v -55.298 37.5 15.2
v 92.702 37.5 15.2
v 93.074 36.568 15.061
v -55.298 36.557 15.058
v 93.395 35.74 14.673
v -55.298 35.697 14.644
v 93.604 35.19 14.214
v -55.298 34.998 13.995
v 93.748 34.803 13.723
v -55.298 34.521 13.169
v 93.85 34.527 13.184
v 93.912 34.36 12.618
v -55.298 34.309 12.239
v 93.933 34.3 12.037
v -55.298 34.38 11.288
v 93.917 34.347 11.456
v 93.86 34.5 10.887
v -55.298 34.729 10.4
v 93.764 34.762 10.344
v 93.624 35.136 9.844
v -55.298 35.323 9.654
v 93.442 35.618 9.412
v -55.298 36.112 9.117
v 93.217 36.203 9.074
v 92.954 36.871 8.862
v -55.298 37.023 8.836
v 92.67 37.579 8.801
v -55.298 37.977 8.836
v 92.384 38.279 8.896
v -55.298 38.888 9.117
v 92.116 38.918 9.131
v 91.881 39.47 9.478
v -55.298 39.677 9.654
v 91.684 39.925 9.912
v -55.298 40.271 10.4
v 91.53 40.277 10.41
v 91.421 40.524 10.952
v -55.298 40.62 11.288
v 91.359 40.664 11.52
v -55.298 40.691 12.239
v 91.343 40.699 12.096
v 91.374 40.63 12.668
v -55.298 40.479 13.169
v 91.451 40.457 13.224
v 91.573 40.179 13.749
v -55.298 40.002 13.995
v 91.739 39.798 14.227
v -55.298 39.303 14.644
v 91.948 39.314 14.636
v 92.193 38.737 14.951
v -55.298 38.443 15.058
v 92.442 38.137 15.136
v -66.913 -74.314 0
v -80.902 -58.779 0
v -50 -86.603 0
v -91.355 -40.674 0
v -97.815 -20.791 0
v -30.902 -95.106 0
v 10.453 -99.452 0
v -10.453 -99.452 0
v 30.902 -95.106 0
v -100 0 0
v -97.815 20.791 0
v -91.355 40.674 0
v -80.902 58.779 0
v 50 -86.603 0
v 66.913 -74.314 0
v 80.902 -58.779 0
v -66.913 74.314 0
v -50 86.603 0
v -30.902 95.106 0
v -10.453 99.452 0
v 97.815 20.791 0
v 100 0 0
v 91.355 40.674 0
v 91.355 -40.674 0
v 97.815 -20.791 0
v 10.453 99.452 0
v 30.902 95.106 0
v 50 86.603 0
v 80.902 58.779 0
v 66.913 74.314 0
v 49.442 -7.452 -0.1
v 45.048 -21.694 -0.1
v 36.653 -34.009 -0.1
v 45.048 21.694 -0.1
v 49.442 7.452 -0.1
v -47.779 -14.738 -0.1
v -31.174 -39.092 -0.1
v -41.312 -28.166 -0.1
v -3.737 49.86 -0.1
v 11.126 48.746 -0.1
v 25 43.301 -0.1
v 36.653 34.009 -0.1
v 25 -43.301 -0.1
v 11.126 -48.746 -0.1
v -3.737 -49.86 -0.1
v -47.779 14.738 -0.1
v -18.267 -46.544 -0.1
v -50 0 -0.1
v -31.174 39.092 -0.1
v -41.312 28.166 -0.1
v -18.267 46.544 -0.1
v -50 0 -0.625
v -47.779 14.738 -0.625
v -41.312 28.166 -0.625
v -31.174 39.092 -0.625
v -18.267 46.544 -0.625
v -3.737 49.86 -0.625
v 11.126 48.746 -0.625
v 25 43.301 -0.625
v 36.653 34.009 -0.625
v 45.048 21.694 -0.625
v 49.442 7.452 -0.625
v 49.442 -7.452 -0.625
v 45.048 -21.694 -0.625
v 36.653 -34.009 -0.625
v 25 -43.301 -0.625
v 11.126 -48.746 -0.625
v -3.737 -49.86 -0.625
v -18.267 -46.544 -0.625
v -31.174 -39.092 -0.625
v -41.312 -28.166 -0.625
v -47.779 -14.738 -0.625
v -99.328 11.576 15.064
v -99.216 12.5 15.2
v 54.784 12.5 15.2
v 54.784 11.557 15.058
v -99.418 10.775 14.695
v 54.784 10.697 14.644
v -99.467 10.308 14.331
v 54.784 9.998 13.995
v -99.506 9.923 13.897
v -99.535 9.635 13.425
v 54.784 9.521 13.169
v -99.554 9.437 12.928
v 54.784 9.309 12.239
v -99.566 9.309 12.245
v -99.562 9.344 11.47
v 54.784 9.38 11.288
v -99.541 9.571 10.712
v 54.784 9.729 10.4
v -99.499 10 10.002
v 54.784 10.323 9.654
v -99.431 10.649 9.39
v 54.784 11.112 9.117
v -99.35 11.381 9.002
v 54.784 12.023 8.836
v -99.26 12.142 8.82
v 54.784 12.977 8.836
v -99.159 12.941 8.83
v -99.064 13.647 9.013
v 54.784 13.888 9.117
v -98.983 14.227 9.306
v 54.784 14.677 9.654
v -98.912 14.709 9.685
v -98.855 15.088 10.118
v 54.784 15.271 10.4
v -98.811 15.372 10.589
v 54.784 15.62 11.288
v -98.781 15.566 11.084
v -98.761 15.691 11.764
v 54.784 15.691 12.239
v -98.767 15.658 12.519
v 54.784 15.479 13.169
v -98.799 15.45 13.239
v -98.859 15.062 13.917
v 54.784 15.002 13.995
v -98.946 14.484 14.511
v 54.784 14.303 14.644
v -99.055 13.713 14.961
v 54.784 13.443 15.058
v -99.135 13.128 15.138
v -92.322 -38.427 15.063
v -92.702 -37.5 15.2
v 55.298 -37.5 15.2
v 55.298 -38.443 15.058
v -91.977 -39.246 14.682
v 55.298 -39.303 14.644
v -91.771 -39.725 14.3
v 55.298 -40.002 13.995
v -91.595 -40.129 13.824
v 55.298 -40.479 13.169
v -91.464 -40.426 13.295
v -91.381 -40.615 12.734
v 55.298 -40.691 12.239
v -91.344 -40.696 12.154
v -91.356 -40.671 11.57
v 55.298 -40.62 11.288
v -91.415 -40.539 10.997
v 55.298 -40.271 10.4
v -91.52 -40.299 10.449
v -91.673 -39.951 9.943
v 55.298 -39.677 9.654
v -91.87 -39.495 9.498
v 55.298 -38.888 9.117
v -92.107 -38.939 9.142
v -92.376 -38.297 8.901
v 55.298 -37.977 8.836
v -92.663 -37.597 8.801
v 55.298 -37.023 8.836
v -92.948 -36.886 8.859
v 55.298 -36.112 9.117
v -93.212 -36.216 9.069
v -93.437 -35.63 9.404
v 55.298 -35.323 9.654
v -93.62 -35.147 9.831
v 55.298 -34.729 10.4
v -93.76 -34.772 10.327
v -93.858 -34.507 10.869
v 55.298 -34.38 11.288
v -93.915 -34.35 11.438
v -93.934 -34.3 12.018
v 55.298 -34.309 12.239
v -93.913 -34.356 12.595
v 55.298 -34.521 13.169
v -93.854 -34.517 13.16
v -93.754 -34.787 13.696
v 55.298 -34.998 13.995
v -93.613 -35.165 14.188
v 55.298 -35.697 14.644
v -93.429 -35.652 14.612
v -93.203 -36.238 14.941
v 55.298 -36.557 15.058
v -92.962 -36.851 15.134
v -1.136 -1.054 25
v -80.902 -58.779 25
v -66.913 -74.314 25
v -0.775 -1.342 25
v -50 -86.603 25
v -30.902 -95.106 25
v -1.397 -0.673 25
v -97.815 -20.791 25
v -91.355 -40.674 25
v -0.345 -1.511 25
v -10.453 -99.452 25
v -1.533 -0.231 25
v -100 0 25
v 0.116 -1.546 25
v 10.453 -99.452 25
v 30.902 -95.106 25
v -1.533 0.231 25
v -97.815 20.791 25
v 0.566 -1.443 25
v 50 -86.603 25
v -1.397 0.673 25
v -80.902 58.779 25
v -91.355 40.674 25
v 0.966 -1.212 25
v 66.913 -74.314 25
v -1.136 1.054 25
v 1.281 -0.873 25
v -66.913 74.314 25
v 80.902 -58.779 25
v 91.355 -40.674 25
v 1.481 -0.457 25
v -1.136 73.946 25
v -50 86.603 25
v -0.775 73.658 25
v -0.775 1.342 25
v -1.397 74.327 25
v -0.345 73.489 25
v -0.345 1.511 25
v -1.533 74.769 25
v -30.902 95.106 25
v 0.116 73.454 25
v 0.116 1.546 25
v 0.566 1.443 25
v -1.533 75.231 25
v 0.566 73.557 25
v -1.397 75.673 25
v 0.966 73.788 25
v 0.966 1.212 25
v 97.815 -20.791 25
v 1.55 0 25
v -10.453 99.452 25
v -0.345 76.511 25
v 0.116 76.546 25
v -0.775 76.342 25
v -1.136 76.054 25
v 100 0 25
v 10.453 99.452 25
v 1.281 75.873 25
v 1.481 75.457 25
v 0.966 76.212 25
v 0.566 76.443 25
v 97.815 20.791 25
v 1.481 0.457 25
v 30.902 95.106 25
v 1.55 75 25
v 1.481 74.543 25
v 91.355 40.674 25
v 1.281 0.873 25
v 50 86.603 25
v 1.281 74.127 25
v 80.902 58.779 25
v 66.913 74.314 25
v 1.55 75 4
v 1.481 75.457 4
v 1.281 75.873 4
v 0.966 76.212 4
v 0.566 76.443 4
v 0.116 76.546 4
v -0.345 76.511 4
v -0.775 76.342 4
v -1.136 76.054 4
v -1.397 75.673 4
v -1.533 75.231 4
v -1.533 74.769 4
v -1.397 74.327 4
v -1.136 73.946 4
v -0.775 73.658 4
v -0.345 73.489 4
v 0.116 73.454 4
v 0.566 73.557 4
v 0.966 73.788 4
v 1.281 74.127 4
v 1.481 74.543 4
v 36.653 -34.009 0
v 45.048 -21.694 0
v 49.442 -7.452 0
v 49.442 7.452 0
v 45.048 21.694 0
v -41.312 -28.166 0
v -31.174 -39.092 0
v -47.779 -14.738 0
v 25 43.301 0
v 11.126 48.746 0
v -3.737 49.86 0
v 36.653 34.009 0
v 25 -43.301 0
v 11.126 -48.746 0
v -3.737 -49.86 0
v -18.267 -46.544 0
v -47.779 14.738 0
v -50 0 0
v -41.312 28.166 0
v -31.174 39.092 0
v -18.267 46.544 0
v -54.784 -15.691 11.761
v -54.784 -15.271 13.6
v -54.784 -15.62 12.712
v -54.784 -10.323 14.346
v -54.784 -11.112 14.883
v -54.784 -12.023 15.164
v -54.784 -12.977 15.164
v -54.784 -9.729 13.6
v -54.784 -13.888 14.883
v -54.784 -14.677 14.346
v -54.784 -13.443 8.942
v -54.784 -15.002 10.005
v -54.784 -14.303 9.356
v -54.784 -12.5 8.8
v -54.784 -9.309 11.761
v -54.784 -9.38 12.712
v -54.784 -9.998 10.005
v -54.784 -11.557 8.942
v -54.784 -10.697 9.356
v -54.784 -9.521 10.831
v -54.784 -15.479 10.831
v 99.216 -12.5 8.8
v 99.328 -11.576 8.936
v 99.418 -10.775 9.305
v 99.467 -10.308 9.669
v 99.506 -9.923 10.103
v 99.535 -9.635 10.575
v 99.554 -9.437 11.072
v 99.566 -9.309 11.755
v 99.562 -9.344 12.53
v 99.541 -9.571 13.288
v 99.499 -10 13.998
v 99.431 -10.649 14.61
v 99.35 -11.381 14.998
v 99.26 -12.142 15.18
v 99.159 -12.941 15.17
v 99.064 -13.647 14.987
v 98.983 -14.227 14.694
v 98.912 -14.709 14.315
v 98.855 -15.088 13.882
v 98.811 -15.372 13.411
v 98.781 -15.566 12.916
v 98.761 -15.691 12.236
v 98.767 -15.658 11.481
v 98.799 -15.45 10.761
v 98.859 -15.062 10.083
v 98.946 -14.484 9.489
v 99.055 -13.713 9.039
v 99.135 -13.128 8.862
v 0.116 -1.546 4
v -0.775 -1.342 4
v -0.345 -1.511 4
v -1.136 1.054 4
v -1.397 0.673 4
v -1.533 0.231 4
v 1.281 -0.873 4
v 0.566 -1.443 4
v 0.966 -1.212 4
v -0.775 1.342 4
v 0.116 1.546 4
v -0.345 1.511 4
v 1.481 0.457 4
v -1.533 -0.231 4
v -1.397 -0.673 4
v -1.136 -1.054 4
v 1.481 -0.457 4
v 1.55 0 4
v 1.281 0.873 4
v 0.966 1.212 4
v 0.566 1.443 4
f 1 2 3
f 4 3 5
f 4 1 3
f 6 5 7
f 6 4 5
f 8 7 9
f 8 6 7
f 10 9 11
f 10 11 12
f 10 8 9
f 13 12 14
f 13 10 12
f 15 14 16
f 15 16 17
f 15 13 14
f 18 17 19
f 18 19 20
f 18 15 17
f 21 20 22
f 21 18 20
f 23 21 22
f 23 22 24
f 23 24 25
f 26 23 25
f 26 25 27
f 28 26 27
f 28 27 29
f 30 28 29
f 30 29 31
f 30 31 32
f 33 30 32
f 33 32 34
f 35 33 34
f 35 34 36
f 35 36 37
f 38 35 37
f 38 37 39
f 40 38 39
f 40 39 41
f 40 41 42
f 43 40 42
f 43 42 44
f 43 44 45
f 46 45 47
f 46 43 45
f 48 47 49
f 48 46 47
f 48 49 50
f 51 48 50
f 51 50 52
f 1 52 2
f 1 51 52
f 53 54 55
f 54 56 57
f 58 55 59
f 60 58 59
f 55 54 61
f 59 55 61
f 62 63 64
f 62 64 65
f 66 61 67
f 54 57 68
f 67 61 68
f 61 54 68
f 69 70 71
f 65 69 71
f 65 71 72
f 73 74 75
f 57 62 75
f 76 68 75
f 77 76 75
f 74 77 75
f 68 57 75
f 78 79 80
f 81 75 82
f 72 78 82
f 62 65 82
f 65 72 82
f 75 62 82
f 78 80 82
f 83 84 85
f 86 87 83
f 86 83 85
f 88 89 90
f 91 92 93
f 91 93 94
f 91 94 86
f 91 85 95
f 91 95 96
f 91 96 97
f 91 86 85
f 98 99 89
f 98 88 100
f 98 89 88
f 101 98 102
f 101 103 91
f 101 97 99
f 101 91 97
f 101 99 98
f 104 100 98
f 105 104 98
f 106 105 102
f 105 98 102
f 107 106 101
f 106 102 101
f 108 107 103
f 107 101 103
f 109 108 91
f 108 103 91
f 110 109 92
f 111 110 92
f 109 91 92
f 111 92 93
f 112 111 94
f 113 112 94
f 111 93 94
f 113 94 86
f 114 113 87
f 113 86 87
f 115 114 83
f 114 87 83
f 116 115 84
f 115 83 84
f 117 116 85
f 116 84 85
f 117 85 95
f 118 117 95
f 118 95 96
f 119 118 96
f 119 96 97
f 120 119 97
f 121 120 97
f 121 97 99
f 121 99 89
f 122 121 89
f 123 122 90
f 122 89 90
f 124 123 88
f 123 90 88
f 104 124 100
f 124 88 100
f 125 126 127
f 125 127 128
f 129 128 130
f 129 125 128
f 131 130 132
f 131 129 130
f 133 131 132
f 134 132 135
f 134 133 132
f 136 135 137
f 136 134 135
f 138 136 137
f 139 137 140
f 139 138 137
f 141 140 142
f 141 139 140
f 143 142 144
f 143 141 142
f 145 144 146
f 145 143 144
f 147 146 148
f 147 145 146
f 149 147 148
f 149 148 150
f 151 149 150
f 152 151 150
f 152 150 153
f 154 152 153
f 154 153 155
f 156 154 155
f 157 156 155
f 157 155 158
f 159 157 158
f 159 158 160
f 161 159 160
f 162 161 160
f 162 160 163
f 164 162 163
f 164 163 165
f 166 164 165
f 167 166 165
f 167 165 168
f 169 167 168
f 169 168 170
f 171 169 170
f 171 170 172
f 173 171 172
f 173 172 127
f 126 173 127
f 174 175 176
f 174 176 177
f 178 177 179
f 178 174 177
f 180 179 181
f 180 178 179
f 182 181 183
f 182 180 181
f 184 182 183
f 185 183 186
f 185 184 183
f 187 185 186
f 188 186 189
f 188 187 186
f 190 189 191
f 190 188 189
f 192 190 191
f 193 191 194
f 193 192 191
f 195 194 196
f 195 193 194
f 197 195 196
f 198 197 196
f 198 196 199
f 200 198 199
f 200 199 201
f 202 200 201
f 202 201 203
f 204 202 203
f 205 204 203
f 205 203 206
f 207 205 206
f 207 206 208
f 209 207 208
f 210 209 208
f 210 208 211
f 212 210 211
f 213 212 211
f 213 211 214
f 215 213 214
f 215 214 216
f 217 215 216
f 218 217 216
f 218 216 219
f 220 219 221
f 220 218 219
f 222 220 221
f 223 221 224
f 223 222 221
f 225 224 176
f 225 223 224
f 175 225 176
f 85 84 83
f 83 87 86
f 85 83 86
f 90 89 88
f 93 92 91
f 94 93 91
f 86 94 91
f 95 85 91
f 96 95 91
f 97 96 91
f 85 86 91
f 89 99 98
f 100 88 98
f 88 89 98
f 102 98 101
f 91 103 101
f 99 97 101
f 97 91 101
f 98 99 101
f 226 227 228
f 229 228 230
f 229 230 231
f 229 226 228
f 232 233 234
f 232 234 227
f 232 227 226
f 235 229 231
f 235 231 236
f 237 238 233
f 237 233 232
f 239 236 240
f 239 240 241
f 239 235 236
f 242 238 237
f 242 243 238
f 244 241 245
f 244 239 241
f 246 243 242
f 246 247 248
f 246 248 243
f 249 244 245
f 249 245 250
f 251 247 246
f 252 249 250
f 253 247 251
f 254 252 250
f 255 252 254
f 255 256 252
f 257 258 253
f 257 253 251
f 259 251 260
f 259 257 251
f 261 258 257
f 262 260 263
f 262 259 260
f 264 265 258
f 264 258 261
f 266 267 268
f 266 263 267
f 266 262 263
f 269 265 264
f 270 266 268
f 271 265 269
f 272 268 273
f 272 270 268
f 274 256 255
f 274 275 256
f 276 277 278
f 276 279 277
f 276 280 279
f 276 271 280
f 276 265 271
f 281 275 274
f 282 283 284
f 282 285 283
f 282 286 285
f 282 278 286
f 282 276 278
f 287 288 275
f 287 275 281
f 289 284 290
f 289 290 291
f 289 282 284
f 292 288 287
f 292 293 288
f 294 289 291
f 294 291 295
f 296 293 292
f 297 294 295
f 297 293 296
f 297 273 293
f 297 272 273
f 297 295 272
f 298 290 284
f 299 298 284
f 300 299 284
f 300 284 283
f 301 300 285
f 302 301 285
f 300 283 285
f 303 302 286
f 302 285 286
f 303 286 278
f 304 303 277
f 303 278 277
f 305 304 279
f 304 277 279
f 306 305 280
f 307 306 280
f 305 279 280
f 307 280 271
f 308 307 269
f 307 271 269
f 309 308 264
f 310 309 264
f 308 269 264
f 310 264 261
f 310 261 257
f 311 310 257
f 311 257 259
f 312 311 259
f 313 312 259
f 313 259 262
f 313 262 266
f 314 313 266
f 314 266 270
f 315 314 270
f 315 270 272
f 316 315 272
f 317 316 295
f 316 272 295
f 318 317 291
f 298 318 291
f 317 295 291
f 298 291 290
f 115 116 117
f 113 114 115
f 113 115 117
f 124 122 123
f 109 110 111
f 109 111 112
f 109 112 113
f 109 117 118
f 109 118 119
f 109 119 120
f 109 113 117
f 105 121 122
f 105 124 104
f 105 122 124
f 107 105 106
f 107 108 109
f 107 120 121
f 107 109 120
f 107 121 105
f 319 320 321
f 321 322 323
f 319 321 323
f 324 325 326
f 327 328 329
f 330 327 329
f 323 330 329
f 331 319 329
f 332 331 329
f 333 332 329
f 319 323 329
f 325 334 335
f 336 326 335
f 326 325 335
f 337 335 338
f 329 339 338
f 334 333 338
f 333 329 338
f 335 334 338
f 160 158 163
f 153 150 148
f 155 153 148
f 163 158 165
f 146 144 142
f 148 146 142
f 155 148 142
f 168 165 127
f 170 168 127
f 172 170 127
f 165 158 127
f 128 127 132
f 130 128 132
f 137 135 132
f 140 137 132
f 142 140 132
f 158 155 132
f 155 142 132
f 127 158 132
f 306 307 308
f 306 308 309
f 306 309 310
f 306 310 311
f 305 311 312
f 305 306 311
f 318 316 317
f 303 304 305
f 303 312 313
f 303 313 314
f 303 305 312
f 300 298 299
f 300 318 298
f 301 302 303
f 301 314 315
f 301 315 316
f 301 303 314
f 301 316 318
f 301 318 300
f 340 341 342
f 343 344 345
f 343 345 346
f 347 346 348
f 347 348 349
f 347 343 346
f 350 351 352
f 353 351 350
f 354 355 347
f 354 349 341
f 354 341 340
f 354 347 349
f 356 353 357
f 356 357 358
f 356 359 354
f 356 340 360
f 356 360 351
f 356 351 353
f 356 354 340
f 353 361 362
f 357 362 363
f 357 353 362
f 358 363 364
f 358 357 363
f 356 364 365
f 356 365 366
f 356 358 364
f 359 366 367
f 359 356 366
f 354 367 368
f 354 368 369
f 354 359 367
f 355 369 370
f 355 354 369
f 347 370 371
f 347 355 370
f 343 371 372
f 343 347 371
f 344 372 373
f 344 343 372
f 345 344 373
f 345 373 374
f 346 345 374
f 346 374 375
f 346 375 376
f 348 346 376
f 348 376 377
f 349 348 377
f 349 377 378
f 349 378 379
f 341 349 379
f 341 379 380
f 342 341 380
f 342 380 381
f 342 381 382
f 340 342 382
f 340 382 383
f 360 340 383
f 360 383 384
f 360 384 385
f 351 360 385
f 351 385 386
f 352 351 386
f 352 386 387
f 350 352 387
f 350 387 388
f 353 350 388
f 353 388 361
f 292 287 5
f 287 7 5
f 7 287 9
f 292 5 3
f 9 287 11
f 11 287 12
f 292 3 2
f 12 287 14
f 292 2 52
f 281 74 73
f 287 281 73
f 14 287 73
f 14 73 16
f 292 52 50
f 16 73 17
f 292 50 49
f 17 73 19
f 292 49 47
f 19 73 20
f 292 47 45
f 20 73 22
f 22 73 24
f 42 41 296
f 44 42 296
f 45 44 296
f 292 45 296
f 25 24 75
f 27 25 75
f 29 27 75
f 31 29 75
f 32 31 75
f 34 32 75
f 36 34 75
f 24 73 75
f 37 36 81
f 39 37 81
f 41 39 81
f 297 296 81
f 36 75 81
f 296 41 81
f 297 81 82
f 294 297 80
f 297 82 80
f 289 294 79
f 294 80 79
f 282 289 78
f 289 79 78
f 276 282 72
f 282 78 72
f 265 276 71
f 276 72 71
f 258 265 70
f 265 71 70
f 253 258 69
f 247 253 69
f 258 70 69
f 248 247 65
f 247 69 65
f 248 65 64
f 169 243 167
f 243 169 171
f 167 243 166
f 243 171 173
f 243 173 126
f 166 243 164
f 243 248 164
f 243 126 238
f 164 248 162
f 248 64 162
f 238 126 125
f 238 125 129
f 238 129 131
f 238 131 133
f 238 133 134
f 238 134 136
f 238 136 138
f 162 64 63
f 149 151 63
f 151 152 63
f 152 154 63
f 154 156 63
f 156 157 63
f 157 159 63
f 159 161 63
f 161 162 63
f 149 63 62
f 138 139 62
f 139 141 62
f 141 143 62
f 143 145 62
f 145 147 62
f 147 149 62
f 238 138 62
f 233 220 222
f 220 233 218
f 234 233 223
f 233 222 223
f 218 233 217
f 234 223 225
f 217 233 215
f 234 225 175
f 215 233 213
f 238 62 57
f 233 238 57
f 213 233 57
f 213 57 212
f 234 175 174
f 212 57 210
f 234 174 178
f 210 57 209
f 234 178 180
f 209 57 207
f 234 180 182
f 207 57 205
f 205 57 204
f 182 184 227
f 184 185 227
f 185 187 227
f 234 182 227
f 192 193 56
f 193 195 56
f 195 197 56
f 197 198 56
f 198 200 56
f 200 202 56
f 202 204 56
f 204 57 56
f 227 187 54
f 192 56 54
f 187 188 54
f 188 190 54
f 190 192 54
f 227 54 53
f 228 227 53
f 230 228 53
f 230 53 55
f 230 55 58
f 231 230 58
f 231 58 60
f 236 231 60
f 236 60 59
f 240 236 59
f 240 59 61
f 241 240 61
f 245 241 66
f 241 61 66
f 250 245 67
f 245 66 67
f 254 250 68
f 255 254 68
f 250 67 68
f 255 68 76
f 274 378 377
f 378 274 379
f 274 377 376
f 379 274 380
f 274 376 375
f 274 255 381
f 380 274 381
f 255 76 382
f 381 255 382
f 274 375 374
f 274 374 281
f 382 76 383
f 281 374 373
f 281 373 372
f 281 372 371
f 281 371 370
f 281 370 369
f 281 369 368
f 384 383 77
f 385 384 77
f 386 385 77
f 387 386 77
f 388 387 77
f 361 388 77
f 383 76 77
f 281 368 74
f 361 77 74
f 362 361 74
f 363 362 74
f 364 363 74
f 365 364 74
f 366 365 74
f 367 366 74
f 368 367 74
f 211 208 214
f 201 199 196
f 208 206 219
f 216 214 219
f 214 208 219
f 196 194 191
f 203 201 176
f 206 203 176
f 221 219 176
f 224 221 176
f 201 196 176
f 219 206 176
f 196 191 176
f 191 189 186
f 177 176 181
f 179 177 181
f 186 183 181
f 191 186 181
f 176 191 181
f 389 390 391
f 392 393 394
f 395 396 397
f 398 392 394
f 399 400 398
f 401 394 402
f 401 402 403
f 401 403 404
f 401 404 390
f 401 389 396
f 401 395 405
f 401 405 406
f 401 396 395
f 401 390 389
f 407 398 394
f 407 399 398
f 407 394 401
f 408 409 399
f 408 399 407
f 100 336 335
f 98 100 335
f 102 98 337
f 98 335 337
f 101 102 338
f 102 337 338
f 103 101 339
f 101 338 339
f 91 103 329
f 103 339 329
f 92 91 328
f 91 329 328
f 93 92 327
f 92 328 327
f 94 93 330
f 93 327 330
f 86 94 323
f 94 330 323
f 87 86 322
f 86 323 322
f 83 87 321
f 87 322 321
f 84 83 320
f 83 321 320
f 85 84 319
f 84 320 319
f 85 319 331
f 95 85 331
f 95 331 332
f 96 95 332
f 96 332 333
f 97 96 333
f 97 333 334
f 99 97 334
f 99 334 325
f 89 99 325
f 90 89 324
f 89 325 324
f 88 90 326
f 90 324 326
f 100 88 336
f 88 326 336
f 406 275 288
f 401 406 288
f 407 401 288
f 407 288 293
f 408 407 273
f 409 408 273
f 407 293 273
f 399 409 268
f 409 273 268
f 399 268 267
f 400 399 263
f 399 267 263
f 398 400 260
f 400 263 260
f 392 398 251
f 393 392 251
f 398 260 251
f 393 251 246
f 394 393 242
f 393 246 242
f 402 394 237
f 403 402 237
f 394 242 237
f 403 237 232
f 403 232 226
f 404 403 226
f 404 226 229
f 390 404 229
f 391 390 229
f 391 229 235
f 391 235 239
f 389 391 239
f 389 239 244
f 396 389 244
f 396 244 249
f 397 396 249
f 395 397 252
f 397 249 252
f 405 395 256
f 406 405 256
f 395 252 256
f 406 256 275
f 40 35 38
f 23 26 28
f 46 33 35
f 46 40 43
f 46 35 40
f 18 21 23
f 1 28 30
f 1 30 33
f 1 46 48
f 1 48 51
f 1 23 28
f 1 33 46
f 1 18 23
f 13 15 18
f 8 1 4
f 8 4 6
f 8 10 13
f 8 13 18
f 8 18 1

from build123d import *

# Parameters (mm, degrees)
SKETCH1_R               = 100
BOSS_EXTRUDE1_DEPTH     = 25
CUT_EXTRUDE1_DEPTH      = 144.614066163
CUT_EXTRUDE1_DEPTH_BACK = 55.2975
SKETCH2_R               = 3.2
CUT_EXTRUDE2_DEPTH      = 144.61406632
CUT_EXTRUDE2_DEPTH_BACK = 54.7843
SKETCH3_R               = 3.2
CUT_EXTRUDE3_DEPTH      = 54.7843
CUT_EXTRUDE3_DEPTH_BACK = 144.61406632
SKETCH4_R               = 3.2
CUT_EXTRUDE4_DEPTH      = 55.2975
CUT_EXTRUDE4_DEPTH_BACK = 144.61406632
SKETCH5_R               = 3.2
SKETCH6_R               = 50
BOSS_EXTRUDE5_DEPTH     = 0.1
SKETCH8_R               = 50
BOSS_EXTRUDE6_DEPTH     = 0.525
SKETCH10_R              = 1.55
CUT_EXTRUDE5_DEPTH      = 21
SKETCH11_R              = 1.55
CUT_EXTRUDE6_DEPTH      = 21


with BuildPart() as part:
    # Sketch1 → Boss-Extrude1 (new body)
    with BuildSketch(Plane.XY):
        Circle(SKETCH1_R)
    extrude(amount=BOSS_EXTRUDE1_DEPTH)

    # Sketch2 → Cut-Extrude1 (cut, two sides: drawn at the far end of the back side and taken through both)
    with BuildSketch(Plane(origin=(0, 0, 0), x_dir=(0, 0, -1), z_dir=(1, 0, 0)).offset(-CUT_EXTRUDE1_DEPTH_BACK)):
        with Locations((-12, 37.5)):
            Circle(SKETCH2_R)
    extrude(amount=CUT_EXTRUDE1_DEPTH + CUT_EXTRUDE1_DEPTH_BACK, mode=Mode.SUBTRACT)

    # Sketch3 → Cut-Extrude2 (cut, two sides: drawn at the far end of the back side and taken through both)
    with BuildSketch(Plane(origin=(0, 0, 0), x_dir=(0, 0, -1), z_dir=(1, 0, 0)).offset(-CUT_EXTRUDE2_DEPTH_BACK)):
        with Locations((-12, -12.5)):
            Circle(SKETCH3_R)
    extrude(amount=CUT_EXTRUDE2_DEPTH + CUT_EXTRUDE2_DEPTH_BACK, mode=Mode.SUBTRACT)

    # Sketch4 → Cut-Extrude3 (cut, two sides: drawn at the far end of the back side and taken through both)
    with BuildSketch(Plane(origin=(0, 0, 0), x_dir=(0, 0, -1), z_dir=(1, 0, 0)).offset(-CUT_EXTRUDE3_DEPTH_BACK)):
        with Locations((-12, 12.5)):
            Circle(SKETCH4_R)
    extrude(amount=CUT_EXTRUDE3_DEPTH + CUT_EXTRUDE3_DEPTH_BACK, mode=Mode.SUBTRACT)

    # Sketch5 → Cut-Extrude4 (cut, two sides: drawn at the far end of the back side and taken through both)
    with BuildSketch(Plane(origin=(0, 0, 0), x_dir=(0, 0, -1), z_dir=(1, 0, 0)).offset(-CUT_EXTRUDE4_DEPTH_BACK)):
        with Locations((-12, -37.5)):
            Circle(SKETCH5_R)
    extrude(amount=CUT_EXTRUDE4_DEPTH + CUT_EXTRUDE4_DEPTH_BACK, mode=Mode.SUBTRACT)

    # Sketch10 → Cut-Extrude5 (cut)
    with BuildSketch(Plane.XY.offset(25)):
        Circle(SKETCH10_R)
    extrude(amount=-CUT_EXTRUDE5_DEPTH, mode=Mode.SUBTRACT)

    # Sketch11 → Cut-Extrude6 (cut)
    with BuildSketch(Plane.XY.offset(25)):
        with Locations((0, 75)):
            Circle(SKETCH11_R)
    extrude(amount=-CUT_EXTRUDE6_DEPTH, mode=Mode.SUBTRACT)


with BuildPart() as body_2:
    # Sketch6 → Boss-Extrude5 (new body)
    with BuildSketch(Plane(origin=(0, 0, 0), x_dir=(-1, 0, 0), z_dir=(0, 0, -1))):
        Circle(SKETCH6_R)
    extrude(amount=BOSS_EXTRUDE5_DEPTH)


with BuildPart() as body_3:
    # Sketch8 → Boss-Extrude6 (new body)
    with BuildSketch(Plane(origin=(0, 0, -0.1), x_dir=(-1, 0, 0), z_dir=(0, 0, -1))):
        Circle(SKETCH8_R)
    extrude(amount=BOSS_EXTRUDE6_DEPTH)


solid = Compound([part.part, body_2.part, body_3.part])
